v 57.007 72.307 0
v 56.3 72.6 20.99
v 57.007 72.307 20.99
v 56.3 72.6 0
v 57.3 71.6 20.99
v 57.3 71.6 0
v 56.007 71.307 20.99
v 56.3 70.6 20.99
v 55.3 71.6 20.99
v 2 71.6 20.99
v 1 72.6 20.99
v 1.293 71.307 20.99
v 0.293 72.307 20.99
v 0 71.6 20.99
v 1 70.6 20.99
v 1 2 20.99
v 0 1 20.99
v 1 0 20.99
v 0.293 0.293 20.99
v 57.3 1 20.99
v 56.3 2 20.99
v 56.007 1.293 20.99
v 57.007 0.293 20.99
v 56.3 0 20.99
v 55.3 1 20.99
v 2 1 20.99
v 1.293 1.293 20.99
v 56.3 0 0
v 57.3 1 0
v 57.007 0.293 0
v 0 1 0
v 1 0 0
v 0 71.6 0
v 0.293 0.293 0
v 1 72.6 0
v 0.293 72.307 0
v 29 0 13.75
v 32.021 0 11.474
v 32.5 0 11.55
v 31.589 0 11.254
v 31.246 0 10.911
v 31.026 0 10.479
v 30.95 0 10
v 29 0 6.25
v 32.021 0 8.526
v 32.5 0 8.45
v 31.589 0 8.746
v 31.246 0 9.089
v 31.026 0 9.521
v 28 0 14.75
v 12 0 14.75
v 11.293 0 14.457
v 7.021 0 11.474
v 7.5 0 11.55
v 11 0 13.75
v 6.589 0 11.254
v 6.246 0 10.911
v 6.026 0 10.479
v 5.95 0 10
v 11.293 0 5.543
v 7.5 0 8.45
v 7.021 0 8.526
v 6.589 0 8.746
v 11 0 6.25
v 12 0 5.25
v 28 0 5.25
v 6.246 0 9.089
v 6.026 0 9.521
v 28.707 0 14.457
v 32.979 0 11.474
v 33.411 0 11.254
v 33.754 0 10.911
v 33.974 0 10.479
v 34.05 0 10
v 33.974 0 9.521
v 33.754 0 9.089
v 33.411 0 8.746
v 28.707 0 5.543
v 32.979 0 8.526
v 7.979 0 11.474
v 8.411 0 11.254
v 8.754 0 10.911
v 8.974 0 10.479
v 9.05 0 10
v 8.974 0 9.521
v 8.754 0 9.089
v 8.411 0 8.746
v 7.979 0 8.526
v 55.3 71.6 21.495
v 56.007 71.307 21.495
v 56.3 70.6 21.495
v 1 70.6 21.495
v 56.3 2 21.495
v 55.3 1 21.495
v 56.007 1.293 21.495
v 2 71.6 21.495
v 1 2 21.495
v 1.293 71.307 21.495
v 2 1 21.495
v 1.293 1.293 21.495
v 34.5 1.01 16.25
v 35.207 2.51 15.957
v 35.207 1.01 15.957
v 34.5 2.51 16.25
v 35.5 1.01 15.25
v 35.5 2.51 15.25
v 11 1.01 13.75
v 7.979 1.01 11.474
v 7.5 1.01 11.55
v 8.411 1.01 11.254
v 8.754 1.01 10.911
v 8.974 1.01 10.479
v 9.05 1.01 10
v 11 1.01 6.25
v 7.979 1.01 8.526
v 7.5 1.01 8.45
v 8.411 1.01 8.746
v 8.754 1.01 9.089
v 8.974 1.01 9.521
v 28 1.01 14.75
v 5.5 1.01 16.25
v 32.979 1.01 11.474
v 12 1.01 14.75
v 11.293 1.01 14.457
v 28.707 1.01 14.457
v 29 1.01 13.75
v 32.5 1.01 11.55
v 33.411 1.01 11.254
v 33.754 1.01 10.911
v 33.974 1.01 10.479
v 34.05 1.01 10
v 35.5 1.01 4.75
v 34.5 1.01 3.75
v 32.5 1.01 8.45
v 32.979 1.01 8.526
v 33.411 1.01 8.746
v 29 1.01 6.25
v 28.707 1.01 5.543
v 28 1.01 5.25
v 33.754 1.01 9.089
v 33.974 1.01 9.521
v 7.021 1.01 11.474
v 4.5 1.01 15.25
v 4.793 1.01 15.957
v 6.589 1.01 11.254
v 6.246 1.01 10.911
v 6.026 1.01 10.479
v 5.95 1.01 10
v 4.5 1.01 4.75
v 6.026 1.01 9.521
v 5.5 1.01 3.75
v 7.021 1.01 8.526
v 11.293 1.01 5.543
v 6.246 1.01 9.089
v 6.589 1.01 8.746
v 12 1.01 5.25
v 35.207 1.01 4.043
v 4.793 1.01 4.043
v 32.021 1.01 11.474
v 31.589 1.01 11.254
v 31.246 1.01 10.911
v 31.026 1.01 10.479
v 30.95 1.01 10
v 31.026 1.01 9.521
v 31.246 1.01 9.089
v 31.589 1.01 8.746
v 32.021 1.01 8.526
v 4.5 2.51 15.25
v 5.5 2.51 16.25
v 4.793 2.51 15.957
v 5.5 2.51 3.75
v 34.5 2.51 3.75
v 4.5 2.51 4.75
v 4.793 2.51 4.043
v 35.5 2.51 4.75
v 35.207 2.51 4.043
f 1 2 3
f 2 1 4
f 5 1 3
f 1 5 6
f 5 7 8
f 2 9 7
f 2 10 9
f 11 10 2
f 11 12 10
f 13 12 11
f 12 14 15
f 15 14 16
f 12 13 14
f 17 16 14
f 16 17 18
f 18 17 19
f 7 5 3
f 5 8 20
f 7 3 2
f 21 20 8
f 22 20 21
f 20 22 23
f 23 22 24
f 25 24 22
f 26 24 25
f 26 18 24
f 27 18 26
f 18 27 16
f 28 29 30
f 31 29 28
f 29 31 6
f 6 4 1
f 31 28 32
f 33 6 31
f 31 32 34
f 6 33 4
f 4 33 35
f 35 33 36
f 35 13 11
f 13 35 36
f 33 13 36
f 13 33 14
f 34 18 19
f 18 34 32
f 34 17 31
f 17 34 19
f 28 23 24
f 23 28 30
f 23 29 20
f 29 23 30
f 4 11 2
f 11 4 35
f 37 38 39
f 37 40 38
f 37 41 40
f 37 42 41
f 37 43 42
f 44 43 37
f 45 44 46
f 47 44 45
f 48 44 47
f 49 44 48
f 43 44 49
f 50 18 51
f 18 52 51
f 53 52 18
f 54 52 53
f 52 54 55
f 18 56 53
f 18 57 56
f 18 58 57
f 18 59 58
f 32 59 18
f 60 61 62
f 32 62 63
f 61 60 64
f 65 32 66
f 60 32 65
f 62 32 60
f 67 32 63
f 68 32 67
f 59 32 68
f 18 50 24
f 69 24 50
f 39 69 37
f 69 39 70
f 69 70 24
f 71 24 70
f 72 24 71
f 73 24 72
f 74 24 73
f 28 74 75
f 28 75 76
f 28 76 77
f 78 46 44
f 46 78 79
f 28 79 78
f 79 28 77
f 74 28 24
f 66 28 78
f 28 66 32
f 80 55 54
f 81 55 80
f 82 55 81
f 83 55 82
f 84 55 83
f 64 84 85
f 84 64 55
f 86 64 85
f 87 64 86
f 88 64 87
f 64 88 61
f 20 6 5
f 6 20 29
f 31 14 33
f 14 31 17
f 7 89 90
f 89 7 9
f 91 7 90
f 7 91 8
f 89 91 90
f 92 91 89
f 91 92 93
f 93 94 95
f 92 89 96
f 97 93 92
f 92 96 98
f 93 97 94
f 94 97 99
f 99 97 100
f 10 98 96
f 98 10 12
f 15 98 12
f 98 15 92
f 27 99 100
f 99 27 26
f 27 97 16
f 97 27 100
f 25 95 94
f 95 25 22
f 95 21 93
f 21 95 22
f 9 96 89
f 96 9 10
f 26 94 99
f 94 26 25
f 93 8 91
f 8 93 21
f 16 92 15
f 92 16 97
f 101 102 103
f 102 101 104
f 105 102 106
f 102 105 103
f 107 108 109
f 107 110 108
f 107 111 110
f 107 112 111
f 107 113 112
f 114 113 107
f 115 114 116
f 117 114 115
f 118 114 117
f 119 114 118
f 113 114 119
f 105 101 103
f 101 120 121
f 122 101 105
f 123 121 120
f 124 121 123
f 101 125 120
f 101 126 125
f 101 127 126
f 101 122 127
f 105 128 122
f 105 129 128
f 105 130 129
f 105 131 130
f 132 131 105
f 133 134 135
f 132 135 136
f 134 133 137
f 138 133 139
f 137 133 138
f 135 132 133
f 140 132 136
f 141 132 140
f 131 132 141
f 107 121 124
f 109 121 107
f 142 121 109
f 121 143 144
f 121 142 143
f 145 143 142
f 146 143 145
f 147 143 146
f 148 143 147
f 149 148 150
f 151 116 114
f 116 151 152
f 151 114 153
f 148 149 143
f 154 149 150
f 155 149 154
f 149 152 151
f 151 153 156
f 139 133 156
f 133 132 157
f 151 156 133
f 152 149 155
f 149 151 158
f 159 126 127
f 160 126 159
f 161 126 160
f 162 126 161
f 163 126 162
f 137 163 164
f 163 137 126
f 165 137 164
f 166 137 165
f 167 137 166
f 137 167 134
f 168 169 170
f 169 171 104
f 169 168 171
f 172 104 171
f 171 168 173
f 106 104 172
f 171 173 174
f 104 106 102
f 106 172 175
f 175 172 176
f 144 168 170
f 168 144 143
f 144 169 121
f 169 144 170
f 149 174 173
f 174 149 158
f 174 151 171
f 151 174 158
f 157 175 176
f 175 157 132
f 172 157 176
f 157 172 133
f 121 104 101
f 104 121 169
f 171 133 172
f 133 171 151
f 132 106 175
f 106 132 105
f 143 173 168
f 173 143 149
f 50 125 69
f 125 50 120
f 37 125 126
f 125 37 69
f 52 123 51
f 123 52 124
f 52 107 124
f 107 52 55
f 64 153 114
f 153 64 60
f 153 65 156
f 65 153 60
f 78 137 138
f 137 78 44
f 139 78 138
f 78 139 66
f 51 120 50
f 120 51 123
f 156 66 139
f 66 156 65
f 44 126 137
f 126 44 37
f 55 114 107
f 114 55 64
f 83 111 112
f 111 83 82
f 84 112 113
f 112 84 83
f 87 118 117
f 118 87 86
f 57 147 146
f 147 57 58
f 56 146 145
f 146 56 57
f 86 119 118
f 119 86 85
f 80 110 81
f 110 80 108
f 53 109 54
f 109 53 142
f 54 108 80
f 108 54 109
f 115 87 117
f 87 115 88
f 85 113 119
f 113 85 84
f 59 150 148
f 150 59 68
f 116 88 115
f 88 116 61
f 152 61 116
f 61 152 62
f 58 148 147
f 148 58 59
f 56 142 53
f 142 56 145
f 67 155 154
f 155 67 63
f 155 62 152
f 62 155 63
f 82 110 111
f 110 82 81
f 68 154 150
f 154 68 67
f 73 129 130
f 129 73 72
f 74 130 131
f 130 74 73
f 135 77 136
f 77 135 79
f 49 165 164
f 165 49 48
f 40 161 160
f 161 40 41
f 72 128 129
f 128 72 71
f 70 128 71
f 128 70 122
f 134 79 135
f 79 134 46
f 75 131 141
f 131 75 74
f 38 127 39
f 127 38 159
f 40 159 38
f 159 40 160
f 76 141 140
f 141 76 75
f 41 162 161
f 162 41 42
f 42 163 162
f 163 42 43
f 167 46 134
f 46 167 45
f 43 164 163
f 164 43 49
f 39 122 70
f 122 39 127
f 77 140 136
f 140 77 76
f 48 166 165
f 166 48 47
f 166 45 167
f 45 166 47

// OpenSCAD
// file: ../components/db9/db9_negative.scad
use <../../basics/cube_fillet.scad>;
module db9_negative(){
    union(){
        //baseplate
        translate([0,0,-0.75]){
            cube_fillet([31,12.5,1.5], 1);
        }

        //connector

        translate([0,0,2.5]){
            cube_fillet([18, 9.5, 5], 1);
        }

        //mount holes
        translate([-12.5, 0, 0]){
            cylinder(h=5, r=1.55, $fn=20);
        }
        translate([12.5, 0, 0]){
            cylinder(h=5, r=1.55, $fn=20);
        }
    }
}

db9_negative();
// file: ../basics/cube_fillet.scad
// use $fn % 4 = 0;
module cube_fillet(lwh=[1,1,1], r=0.1, $fn=8, center=true) {
    $fn = ceil($fn / 4) * 4;
    
    center_translation = center ? [0,0,0] : [lwh[0] * 0.5, lwh[1] * 0.5, lwh[2] * 0.5, ];
    
    translate(center_translation){
        union(){
            //corners
            //NE
            translate([lwh[0] * 0.5 - r, lwh[1] * 0.5 - r, -lwh[2]*0.5]){ 
                cylinder(h=lwh[2], r=r, $fn=$fn);
            }
            //SE
            translate([-(lwh[0] * 0.5 - r), lwh[1] * 0.5 - r, -lwh[2]*0.5]){
                cylinder(h=lwh[2], r=r, $fn=$fn);
            }
            //NE
            translate([-(lwh[0] * 0.5 - r), -(lwh[1] * 0.5 - r), -lwh[2]*0.5]){
                cylinder(h=lwh[2], r=r, $fn=$fn);
            }
            //SE
            translate([lwh[0] * 0.5 - r, -(lwh[1] * 0.5 - r), -lwh[2]*0.5]){
                cylinder(h=lwh[2], r=r, $fn=$fn);
            }
            
            // boxes
            cube([lwh[0] - 2*r, lwh[1], lwh[2]], true);
            cube([lwh[0], lwh[1] - 2*r, lwh[2]], true);
        };
    }
};

cube_fillet(center=false);
// main file
use <../basics/cube_fillet.scad>;
use <../components/db9/db9_negative.scad>;


inner_tol = 1;
wall_thickness = 1;
standoff_height = 6;
box_height = 14;
box_inner = [53.3 + 2*inner_tol, 68.6 + 2*inner_tol, box_height + standoff_height];
box_outer = [box_inner[0] + 2*wall_thickness, box_inner[1] + 2*wall_thickness, box_inner[2] + wall_thickness - 0.01];

difference(){
    translate([box_outer[0] * 0.5, box_outer[1] * 0.5,box_outer[2] * 0.5,]){
        cube_fillet(box_outer, 1);
        translate([0, 0, wall_thickness]){
            cube_fillet(box_inner, 1);
        }
    }
    // serial ports
    translate([20, 1.01, 10]){
        rotate([90,0,0]){
            db9_negative();
        }
    }
};
